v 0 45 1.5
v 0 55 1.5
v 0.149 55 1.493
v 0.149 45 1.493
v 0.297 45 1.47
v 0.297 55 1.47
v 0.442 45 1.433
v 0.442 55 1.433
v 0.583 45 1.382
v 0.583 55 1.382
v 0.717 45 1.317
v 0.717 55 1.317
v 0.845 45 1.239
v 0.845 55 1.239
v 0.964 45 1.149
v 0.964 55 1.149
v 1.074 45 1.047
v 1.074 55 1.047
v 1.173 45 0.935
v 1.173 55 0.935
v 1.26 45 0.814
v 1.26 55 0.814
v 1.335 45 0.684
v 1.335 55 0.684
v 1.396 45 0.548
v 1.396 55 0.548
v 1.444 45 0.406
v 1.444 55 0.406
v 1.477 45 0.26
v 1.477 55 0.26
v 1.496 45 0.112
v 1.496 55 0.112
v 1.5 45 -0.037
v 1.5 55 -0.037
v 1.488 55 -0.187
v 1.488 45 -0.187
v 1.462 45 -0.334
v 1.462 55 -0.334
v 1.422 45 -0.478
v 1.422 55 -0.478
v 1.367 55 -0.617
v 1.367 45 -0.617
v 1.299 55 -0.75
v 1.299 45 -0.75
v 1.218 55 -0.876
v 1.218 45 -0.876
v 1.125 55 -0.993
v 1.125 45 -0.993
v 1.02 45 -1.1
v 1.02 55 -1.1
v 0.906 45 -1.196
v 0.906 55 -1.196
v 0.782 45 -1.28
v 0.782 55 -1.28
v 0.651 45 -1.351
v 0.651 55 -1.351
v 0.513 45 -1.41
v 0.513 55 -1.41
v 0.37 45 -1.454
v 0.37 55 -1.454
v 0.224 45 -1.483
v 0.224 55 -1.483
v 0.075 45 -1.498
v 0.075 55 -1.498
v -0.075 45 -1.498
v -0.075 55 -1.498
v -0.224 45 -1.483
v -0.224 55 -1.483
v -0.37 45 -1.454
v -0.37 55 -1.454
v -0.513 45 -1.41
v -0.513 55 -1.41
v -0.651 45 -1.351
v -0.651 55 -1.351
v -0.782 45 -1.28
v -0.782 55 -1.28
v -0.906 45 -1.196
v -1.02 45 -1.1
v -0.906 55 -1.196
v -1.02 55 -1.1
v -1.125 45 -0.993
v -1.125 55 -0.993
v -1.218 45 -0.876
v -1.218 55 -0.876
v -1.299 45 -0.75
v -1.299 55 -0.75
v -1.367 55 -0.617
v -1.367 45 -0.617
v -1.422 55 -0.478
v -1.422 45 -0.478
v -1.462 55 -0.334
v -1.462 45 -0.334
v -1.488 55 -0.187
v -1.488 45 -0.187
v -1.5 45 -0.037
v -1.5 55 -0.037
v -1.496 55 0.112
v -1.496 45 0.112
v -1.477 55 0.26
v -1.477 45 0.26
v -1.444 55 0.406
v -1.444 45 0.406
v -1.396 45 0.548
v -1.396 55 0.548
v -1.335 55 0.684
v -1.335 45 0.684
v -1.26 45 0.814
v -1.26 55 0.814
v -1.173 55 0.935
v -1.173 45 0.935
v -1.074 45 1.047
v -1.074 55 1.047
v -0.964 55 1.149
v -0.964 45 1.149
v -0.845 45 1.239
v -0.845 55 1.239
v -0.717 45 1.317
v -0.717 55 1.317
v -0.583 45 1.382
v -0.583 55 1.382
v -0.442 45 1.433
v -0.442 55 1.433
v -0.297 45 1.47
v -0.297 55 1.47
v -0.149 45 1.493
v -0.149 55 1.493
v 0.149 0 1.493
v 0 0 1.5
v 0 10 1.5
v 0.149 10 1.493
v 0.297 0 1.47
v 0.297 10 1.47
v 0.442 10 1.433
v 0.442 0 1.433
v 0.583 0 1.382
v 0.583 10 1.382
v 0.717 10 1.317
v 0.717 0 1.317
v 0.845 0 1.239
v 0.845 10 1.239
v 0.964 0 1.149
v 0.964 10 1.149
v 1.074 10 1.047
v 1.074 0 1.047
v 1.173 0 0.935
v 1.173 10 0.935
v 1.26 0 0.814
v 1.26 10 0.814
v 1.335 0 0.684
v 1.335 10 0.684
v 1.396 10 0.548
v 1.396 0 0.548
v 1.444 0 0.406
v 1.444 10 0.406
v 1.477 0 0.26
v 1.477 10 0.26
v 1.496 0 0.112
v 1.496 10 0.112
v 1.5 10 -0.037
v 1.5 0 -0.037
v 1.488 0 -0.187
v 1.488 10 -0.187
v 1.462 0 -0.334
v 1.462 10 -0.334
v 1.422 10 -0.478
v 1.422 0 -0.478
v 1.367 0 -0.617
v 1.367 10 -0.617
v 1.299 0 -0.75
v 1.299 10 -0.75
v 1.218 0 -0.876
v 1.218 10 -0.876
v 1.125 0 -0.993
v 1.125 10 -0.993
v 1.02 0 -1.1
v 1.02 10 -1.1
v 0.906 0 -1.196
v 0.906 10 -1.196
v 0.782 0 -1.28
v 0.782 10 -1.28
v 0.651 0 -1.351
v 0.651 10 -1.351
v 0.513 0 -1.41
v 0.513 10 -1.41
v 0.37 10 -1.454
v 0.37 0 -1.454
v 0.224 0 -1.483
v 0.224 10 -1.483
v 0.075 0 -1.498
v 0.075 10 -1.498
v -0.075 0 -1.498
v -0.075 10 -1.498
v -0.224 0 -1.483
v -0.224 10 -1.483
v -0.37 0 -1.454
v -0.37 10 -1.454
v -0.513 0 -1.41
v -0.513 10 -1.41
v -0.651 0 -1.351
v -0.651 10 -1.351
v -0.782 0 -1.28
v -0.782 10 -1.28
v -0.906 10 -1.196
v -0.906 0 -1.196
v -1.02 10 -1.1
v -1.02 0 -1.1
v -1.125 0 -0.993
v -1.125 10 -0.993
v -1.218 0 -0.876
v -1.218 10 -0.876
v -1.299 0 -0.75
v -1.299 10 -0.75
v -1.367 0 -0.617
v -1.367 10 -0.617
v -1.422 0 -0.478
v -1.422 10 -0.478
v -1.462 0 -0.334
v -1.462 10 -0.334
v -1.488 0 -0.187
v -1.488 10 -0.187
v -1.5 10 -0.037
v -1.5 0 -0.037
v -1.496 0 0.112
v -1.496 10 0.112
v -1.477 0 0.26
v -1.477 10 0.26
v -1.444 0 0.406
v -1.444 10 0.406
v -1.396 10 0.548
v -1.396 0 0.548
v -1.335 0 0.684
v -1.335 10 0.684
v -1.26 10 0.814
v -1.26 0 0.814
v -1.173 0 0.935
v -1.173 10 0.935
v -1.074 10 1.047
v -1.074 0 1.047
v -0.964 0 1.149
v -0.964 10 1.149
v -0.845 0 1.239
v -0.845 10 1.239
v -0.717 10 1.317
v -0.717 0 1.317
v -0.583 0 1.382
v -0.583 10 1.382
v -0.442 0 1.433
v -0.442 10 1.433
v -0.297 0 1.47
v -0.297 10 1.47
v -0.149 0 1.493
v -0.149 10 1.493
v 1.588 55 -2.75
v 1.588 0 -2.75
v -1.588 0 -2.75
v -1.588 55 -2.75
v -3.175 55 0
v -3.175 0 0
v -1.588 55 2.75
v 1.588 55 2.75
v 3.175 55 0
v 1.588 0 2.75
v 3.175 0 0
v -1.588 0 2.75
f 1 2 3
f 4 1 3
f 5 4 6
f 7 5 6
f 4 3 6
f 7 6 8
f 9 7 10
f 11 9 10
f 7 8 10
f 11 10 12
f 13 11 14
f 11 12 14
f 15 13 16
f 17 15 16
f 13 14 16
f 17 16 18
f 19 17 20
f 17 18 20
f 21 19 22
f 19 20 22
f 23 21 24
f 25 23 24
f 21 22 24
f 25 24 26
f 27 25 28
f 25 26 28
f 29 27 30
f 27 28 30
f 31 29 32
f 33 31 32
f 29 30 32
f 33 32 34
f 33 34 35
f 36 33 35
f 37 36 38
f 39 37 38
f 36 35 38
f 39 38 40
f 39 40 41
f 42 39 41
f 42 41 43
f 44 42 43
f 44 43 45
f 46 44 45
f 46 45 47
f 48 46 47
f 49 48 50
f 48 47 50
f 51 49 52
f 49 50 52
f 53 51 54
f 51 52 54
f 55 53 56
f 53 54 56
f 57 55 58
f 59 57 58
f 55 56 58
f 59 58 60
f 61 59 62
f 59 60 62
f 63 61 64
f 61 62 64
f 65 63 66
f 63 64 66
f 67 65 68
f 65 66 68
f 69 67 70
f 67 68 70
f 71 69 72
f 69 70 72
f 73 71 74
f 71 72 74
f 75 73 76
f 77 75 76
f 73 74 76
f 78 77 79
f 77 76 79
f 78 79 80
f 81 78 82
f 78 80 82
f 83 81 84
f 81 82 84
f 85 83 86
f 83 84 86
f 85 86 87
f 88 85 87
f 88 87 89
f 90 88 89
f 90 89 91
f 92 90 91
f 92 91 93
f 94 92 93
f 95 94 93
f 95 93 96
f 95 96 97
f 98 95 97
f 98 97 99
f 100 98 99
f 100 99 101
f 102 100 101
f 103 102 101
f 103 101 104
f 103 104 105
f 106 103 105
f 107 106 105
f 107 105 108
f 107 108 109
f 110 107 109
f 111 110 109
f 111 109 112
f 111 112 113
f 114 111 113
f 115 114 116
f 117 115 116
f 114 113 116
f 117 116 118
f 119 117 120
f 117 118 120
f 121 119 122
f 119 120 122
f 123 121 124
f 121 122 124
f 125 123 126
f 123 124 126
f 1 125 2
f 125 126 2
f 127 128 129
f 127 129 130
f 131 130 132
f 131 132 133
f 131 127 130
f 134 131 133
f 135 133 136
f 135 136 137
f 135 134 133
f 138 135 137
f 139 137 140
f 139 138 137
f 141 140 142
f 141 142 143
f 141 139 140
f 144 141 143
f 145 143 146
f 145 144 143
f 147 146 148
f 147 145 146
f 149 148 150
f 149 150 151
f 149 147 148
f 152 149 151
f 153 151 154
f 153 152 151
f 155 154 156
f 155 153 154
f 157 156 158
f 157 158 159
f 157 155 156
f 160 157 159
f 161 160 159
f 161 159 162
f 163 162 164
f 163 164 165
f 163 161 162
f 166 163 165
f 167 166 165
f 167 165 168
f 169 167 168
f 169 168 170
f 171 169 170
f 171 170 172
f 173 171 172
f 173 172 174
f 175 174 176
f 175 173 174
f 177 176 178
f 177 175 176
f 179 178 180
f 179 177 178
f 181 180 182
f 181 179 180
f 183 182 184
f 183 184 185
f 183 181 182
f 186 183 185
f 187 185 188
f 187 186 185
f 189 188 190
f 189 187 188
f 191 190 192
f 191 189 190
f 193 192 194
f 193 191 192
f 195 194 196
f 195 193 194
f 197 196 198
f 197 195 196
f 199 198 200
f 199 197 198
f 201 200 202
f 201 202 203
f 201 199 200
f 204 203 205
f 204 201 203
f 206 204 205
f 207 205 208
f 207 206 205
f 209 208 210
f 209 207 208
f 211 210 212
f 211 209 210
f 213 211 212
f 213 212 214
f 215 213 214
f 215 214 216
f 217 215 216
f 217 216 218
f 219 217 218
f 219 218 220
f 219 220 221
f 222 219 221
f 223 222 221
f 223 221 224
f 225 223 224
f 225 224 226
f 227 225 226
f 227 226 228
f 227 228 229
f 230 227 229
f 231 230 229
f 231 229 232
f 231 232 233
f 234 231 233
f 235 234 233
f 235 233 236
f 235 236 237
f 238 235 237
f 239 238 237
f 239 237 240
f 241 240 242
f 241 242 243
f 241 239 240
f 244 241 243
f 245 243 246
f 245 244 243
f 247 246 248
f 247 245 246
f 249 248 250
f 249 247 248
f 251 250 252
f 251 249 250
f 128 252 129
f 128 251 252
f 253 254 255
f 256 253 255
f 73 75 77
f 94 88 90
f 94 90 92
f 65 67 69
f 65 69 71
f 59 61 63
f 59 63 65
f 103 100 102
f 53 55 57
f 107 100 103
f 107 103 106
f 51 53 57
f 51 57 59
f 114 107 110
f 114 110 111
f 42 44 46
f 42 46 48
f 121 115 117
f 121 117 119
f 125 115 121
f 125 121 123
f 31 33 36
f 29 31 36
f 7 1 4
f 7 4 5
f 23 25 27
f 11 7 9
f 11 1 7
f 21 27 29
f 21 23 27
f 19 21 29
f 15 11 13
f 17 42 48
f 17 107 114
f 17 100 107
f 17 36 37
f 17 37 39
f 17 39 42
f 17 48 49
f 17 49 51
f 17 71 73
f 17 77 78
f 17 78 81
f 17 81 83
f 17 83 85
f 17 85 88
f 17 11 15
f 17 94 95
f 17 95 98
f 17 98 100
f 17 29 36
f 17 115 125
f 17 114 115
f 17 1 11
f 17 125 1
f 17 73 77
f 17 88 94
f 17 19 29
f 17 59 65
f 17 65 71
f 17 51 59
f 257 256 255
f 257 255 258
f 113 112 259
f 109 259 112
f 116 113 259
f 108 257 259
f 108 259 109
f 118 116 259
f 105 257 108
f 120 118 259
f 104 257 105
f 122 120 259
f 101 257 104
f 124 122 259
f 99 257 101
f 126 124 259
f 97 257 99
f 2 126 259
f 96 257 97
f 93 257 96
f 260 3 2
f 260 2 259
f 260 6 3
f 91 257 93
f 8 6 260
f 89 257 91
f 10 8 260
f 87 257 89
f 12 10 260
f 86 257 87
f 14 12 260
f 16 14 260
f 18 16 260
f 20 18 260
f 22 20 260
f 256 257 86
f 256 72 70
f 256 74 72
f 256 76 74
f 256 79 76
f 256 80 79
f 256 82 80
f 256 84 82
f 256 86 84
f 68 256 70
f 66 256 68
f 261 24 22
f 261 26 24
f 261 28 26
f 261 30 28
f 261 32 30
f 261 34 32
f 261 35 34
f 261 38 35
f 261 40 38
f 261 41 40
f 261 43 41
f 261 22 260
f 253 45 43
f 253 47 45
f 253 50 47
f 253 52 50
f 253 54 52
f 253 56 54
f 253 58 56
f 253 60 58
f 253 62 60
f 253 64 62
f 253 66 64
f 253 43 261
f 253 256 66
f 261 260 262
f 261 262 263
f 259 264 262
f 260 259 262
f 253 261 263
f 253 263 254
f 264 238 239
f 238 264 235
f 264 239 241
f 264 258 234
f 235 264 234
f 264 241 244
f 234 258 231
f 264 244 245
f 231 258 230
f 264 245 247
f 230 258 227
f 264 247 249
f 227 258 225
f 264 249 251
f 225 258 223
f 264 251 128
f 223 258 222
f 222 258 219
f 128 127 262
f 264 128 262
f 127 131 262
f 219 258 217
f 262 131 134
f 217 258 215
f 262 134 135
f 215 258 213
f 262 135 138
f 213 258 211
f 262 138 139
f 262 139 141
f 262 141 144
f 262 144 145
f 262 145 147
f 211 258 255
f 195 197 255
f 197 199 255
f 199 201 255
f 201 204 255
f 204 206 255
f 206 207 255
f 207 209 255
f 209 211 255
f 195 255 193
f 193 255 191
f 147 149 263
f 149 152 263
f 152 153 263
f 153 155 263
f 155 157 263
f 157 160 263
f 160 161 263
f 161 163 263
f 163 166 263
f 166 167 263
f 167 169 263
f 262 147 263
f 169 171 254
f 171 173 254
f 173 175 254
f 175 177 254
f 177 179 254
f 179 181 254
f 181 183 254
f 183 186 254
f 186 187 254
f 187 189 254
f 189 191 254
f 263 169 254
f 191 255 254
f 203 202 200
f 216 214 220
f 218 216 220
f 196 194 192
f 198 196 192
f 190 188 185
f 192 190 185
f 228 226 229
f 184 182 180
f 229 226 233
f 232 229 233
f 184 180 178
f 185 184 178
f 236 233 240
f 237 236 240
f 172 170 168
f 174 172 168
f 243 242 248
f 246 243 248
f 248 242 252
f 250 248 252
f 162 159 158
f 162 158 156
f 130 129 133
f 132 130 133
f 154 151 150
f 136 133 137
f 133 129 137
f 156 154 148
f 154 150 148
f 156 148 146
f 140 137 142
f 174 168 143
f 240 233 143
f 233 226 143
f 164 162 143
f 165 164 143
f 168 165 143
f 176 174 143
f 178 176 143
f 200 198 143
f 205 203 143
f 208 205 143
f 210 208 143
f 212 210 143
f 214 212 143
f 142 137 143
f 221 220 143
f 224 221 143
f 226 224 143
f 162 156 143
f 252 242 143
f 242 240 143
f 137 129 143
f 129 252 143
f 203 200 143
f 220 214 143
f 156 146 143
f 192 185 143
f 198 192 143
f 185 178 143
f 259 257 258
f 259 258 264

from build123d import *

# Parameters (mm, degrees)
BOSS_EXTRUDE1_DEPTH = 55
SKETCH2_R           = 1.5
CUT_EXTRUDE1_DEPTH  = 10


with BuildPart() as part:
    # Sketch1 → Boss-Extrude1 (new body)
    with BuildSketch(Plane(origin=(0, 0, 0), x_dir=(1, 0, 0), z_dir=(0, 1, 0))):
        Polygon((3.175426481, 0), (1.58771324, 2.75), (-1.58771324, 2.75), (-3.175426481, 0), (-1.58771324, -2.75), (1.58771324, -2.75), align=None)
    extrude(amount=BOSS_EXTRUDE1_DEPTH)

    # Sketch2 → Cut-Extrude1 (cut)
    with BuildSketch(Plane(origin=(0, 55, 0), x_dir=(1, 0, 0), z_dir=(0, 1, 0))):
        with Locations(Location((0, 0, 0), (0, 0, 270))):
            Circle(SKETCH2_R)
    cut_extrude1 = extrude(amount=-CUT_EXTRUDE1_DEPTH, mode=Mode.SUBTRACT)

    # Mirror1: Cut-Extrude1 across plane
    add(cut_extrude1.mirror(Plane(origin=(0, 27.5, 0), x_dir=(0, 0, 1), z_dir=(0, -1, 0))), mode=Mode.SUBTRACT)


solid = part.part
